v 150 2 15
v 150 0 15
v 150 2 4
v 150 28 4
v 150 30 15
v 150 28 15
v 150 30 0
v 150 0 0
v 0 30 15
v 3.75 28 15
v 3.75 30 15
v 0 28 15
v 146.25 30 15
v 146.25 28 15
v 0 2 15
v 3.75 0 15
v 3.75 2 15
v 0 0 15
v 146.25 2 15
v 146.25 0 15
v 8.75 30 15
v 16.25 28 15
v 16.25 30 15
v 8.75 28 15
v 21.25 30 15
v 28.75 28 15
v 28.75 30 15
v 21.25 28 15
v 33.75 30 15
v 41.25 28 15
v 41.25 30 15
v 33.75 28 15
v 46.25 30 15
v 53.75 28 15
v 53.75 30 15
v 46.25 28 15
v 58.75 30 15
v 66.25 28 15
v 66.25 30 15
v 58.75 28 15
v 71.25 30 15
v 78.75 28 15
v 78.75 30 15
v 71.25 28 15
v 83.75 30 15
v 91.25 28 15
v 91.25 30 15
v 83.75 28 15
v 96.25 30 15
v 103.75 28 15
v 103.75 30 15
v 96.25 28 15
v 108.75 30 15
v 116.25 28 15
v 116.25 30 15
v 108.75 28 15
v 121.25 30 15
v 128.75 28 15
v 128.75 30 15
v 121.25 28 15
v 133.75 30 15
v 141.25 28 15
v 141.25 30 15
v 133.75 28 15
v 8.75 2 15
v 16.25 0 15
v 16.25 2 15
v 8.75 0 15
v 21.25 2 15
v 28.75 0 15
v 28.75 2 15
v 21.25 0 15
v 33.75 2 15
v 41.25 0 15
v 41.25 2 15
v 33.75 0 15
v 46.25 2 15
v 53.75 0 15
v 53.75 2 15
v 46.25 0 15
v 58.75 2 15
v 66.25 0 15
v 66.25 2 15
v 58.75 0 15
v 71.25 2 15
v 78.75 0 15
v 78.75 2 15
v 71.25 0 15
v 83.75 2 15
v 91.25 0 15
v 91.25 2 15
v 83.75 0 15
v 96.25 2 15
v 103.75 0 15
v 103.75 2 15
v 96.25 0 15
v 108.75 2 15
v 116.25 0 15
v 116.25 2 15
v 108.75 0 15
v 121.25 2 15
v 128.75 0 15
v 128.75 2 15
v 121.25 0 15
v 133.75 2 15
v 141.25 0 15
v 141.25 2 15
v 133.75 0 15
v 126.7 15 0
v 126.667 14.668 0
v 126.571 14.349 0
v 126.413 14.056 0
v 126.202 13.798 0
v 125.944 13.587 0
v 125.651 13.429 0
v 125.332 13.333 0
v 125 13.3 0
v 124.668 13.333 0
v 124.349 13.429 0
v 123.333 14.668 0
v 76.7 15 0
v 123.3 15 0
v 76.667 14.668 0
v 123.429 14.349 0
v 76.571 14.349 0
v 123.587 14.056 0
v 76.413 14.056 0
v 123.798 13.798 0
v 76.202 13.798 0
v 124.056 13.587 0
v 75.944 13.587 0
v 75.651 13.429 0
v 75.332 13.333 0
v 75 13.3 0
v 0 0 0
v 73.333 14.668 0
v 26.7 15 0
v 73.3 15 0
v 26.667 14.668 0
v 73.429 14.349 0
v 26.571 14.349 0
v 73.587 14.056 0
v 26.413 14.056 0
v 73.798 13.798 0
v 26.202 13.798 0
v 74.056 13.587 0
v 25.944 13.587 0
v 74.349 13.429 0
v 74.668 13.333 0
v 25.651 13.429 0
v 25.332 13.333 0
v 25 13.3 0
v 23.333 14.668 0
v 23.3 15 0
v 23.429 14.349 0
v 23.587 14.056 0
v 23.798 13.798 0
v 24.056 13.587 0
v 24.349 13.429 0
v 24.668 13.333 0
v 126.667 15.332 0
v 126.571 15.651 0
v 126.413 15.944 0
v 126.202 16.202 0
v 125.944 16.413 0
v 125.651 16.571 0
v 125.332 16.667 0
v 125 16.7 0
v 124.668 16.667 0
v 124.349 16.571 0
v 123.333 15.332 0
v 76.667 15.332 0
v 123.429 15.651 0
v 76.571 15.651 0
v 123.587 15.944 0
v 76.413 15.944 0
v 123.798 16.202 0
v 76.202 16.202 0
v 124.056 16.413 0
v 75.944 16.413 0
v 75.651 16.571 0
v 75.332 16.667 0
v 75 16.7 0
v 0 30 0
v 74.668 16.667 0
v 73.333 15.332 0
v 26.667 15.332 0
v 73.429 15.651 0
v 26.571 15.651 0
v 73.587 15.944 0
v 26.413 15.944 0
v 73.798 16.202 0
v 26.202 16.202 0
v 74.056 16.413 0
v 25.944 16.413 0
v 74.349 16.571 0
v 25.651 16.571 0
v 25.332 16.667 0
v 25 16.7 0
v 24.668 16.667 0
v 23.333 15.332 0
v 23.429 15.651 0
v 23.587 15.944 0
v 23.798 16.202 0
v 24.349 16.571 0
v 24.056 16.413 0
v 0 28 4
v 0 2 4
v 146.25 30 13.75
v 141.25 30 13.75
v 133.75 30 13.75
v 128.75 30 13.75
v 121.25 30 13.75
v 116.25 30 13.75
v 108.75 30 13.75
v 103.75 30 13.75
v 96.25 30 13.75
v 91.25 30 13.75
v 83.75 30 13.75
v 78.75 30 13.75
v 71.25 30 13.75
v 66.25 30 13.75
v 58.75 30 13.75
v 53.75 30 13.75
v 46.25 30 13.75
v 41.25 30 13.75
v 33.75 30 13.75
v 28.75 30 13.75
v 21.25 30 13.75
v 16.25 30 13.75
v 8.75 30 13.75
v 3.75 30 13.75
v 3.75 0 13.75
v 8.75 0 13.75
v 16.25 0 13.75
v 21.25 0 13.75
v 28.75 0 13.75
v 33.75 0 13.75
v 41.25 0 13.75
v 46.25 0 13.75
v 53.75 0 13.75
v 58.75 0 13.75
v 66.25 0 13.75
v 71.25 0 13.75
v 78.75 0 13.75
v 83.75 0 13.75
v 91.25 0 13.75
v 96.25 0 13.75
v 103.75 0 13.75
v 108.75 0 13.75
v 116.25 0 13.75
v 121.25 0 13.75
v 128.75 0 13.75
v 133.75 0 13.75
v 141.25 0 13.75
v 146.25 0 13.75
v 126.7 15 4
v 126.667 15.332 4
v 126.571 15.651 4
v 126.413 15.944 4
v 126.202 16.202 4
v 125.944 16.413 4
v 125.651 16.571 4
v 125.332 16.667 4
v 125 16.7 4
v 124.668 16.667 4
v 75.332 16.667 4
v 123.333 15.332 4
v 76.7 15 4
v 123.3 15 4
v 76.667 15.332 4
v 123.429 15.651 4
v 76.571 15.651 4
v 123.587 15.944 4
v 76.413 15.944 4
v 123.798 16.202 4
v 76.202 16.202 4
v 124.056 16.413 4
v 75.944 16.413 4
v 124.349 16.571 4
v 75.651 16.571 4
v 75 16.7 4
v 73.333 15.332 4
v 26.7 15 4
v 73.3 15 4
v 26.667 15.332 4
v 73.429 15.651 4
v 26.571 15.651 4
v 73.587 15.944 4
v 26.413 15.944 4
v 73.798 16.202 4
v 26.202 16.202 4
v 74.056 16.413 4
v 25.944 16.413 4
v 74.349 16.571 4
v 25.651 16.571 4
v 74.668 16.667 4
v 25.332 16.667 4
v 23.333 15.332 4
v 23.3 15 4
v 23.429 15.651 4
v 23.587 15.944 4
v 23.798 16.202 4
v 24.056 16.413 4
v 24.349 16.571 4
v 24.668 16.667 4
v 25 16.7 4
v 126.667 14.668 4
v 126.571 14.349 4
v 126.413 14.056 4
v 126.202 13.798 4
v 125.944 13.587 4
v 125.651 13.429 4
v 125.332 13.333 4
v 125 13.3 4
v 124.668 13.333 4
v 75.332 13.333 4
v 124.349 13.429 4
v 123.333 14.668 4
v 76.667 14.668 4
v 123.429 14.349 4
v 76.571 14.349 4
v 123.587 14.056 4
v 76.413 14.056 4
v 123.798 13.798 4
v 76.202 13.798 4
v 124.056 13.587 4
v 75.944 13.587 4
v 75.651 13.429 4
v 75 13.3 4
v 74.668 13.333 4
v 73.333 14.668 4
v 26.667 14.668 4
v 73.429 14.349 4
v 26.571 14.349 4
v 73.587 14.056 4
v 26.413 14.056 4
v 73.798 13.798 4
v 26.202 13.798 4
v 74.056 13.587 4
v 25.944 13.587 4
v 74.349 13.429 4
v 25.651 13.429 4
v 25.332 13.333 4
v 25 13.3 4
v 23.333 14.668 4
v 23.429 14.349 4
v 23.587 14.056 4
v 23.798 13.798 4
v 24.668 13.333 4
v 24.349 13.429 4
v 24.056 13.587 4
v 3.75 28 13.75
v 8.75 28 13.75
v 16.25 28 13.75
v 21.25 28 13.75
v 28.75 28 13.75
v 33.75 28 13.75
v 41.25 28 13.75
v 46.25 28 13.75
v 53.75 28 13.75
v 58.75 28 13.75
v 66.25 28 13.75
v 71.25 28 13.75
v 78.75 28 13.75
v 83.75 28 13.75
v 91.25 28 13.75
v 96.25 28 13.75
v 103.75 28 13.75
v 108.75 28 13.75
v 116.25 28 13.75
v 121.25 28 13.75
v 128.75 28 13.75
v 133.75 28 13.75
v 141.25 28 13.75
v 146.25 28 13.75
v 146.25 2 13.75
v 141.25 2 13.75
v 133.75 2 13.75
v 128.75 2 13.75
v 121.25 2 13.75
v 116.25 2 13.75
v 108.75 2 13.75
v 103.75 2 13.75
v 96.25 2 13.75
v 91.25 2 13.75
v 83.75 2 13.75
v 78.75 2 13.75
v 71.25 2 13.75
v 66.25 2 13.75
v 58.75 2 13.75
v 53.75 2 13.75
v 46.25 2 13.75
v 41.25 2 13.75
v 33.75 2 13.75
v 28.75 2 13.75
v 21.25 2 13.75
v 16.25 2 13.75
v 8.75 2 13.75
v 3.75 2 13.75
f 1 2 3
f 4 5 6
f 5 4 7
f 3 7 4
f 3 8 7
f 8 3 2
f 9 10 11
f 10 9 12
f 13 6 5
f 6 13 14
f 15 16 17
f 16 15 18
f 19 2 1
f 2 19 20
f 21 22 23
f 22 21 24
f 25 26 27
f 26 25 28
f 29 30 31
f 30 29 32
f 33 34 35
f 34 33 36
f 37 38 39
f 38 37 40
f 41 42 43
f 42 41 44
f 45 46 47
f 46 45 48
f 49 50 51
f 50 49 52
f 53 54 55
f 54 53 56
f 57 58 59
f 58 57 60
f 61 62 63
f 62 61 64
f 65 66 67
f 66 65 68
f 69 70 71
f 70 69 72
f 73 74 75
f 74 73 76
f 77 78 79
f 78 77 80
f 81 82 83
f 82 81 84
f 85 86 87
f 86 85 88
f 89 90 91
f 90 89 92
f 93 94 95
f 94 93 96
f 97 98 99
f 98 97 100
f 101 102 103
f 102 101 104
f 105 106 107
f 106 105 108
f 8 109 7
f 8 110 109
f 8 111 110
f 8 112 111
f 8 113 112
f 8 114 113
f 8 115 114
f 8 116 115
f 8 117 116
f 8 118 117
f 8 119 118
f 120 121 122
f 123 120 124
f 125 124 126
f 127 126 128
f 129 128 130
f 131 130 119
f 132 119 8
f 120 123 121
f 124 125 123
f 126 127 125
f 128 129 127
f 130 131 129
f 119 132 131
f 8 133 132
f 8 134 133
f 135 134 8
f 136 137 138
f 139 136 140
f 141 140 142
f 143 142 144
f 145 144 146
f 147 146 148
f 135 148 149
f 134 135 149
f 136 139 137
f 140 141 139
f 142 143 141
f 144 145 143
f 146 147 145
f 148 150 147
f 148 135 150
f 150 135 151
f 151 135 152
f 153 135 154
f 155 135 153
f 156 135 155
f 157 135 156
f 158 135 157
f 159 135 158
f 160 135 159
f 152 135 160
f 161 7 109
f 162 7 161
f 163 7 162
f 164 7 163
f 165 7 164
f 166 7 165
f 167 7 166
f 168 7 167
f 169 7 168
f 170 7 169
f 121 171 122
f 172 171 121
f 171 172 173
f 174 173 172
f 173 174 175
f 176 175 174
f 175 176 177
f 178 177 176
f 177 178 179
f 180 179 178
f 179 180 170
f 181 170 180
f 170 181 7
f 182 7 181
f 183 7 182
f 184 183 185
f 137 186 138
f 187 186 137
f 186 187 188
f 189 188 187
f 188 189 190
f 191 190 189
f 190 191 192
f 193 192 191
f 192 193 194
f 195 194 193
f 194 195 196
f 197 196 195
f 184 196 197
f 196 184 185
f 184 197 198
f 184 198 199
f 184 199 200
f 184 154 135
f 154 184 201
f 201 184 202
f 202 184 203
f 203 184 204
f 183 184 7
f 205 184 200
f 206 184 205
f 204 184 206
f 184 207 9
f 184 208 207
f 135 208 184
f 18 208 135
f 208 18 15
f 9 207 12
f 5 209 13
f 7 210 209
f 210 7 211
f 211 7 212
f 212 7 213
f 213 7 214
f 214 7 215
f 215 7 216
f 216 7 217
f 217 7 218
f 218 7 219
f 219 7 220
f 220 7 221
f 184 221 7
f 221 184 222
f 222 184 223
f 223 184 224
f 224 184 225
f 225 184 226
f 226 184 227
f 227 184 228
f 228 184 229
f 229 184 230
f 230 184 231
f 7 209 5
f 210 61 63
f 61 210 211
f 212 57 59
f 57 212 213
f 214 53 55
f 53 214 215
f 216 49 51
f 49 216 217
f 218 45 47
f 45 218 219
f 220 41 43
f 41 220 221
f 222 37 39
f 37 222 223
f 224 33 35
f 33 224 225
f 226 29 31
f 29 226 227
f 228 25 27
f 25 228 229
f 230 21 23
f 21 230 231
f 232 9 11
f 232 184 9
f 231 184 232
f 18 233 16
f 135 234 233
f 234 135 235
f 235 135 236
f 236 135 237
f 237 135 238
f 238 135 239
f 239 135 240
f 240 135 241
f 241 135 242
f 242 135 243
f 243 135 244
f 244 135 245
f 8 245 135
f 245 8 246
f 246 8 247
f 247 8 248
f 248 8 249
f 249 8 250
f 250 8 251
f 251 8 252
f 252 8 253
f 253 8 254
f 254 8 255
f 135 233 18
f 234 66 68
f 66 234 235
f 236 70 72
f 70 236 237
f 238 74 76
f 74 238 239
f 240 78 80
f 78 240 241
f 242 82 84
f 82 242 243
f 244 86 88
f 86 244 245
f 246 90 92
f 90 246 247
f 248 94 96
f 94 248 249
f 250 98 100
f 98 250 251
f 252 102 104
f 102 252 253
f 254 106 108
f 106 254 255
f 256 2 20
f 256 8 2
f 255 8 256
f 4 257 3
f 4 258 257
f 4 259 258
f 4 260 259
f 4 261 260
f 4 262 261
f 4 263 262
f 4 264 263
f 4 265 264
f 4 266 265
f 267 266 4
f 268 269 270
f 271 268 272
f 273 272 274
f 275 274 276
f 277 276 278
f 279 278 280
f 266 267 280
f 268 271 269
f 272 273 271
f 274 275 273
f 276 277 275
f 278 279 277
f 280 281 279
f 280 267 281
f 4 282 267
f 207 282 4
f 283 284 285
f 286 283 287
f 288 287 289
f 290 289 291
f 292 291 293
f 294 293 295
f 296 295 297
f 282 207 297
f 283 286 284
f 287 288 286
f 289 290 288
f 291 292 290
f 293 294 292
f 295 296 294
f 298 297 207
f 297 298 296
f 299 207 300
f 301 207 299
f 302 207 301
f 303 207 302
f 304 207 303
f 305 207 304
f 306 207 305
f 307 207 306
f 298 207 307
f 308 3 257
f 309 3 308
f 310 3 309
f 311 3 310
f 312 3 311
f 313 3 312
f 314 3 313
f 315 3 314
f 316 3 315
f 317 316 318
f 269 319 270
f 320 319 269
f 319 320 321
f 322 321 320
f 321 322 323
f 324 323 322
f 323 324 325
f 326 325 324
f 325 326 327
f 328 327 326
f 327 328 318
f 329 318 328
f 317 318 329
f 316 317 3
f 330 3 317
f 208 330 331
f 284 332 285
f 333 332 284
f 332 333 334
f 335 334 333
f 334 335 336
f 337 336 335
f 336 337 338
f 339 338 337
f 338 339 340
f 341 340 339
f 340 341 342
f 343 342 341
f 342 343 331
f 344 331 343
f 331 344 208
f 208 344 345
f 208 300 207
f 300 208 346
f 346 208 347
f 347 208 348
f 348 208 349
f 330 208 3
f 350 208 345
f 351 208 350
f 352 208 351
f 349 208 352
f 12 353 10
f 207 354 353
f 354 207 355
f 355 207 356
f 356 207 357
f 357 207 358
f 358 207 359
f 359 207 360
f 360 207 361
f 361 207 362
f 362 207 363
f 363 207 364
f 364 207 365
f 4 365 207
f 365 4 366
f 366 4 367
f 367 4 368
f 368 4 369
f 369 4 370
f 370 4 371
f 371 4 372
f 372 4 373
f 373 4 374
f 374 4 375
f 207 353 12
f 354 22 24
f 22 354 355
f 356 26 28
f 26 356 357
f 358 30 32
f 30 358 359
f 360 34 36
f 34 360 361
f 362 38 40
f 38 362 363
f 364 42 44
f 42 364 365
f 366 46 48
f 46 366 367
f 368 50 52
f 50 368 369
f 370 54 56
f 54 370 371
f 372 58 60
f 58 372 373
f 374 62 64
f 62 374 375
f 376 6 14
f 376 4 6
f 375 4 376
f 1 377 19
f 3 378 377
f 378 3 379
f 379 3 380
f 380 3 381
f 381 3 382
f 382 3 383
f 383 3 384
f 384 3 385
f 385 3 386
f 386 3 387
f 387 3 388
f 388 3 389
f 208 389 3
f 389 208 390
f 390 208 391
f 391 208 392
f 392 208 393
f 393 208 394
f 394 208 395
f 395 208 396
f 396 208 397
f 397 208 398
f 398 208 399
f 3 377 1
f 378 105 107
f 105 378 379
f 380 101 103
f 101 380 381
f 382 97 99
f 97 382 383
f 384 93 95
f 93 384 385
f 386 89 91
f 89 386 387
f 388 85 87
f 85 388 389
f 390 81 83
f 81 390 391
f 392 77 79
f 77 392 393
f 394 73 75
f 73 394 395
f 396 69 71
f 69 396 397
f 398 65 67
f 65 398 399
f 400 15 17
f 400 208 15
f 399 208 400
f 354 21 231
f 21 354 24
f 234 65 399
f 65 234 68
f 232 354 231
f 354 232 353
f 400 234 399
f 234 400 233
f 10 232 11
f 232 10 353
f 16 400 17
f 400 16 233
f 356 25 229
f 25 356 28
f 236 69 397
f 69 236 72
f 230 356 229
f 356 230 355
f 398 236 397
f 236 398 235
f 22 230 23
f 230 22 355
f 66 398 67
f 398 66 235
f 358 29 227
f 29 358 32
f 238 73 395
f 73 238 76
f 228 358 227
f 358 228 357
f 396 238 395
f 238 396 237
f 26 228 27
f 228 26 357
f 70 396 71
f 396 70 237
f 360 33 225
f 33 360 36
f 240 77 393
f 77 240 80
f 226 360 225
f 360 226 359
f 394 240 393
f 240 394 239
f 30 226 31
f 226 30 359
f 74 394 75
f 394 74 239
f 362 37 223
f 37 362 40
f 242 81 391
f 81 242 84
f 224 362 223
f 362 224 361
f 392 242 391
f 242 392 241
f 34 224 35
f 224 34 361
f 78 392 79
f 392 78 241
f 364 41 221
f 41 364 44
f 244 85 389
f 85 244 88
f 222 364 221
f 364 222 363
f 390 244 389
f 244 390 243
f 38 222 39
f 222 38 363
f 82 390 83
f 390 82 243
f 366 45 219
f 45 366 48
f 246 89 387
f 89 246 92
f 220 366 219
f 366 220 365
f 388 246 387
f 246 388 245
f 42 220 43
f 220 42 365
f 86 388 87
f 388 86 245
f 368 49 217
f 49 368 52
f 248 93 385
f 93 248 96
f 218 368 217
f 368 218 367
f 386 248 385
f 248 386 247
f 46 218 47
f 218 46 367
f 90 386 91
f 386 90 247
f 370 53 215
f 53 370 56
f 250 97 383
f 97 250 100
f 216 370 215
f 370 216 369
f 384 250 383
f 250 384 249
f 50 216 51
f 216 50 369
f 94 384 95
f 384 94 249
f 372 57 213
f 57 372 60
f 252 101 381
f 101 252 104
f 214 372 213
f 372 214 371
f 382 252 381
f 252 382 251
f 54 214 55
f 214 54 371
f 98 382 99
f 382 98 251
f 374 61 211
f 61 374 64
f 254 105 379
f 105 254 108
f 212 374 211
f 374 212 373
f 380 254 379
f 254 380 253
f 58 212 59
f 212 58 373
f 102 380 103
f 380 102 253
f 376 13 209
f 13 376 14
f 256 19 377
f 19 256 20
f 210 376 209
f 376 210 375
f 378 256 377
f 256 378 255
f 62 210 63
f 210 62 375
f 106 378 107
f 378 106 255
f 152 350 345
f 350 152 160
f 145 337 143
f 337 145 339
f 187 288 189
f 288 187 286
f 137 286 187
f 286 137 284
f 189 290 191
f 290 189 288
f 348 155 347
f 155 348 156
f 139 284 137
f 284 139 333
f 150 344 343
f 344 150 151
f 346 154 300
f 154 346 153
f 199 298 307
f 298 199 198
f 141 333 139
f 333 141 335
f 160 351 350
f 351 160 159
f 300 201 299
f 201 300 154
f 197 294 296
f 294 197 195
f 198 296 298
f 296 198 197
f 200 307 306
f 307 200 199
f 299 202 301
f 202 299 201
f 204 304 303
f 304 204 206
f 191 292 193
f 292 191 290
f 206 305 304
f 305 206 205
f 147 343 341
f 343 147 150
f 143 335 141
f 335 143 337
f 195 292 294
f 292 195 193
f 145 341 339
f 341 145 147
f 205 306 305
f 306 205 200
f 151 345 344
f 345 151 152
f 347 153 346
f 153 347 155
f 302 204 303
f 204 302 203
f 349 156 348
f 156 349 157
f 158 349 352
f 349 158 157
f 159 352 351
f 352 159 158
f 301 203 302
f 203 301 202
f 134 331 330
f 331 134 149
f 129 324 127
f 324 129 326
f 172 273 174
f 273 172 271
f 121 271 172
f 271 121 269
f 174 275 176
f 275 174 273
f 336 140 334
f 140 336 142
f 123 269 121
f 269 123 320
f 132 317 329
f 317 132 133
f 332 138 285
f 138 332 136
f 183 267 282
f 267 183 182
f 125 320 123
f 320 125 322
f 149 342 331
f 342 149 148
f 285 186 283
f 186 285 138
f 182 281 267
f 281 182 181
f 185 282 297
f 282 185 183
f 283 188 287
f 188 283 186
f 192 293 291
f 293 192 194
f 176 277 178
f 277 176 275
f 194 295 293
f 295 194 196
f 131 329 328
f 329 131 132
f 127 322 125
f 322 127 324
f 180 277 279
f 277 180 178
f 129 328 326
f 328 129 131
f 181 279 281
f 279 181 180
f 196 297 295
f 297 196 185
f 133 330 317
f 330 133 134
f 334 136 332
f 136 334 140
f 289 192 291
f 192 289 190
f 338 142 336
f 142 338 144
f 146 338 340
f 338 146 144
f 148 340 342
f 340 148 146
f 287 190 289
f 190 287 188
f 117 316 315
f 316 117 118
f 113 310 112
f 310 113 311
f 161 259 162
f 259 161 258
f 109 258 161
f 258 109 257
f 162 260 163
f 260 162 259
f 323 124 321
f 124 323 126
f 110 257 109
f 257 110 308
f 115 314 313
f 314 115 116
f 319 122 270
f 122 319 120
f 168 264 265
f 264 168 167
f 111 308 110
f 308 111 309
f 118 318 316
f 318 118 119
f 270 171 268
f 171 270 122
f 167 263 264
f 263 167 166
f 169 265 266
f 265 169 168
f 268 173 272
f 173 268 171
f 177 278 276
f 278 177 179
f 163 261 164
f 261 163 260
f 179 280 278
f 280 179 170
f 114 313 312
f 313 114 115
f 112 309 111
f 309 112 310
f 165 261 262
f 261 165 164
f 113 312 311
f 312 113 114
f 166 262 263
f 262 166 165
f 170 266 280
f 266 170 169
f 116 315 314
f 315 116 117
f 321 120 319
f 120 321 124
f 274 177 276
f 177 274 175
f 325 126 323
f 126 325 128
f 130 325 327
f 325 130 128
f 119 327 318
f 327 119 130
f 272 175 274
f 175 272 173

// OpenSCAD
$fn = 32;

// ----------------------------------------------------------------------
// Cable duct: 150 x 30 x 15 mm, 12 fingers
// ----------------------------------------------------------------------

// --- parameters (mm) ---
tray_len = 150;           // duct length, X
tray_w = 30;              // duct width, Y
tray_h = 15;              // duct height, Z
tray_t = 2;               // side wall thickness
floor_t = 4;              // floor thickness
slot_w = 5;               // finger slot width
slot_h = 9.75;            // finger slot height
fingers = 12;             // number of finger slots per side
pitch = 12.5;             // finger pitch
hole_d = 3.4;             // floor mounting hole
hole_n = 3;               // mounting holes in the floor

module shell() {
  difference() {
    cube([tray_len, tray_w, tray_h]);
    /* open top channel */
    translate([-tray_t - 1, tray_t, floor_t])
      cube([tray_len + 2 * tray_t + 2, tray_w - 2 * tray_t, tray_h + 1]);
  }
}

difference() {
  union() {
    shell();
  }
  /* finger slots cut through both side walls */
  for (i = [0 : fingers - 1]) translate([pitch / 2 + i * pitch - slot_w / 2, -1, floor_t + slot_h]) cube([slot_w, tray_w + 2, tray_h]);
  for (i = [0 : hole_n - 1]) translate([(tray_len / hole_n) * (i + 0.5), tray_w / 2, -1]) cylinder(h = floor_t + 2, d = hole_d);
}
